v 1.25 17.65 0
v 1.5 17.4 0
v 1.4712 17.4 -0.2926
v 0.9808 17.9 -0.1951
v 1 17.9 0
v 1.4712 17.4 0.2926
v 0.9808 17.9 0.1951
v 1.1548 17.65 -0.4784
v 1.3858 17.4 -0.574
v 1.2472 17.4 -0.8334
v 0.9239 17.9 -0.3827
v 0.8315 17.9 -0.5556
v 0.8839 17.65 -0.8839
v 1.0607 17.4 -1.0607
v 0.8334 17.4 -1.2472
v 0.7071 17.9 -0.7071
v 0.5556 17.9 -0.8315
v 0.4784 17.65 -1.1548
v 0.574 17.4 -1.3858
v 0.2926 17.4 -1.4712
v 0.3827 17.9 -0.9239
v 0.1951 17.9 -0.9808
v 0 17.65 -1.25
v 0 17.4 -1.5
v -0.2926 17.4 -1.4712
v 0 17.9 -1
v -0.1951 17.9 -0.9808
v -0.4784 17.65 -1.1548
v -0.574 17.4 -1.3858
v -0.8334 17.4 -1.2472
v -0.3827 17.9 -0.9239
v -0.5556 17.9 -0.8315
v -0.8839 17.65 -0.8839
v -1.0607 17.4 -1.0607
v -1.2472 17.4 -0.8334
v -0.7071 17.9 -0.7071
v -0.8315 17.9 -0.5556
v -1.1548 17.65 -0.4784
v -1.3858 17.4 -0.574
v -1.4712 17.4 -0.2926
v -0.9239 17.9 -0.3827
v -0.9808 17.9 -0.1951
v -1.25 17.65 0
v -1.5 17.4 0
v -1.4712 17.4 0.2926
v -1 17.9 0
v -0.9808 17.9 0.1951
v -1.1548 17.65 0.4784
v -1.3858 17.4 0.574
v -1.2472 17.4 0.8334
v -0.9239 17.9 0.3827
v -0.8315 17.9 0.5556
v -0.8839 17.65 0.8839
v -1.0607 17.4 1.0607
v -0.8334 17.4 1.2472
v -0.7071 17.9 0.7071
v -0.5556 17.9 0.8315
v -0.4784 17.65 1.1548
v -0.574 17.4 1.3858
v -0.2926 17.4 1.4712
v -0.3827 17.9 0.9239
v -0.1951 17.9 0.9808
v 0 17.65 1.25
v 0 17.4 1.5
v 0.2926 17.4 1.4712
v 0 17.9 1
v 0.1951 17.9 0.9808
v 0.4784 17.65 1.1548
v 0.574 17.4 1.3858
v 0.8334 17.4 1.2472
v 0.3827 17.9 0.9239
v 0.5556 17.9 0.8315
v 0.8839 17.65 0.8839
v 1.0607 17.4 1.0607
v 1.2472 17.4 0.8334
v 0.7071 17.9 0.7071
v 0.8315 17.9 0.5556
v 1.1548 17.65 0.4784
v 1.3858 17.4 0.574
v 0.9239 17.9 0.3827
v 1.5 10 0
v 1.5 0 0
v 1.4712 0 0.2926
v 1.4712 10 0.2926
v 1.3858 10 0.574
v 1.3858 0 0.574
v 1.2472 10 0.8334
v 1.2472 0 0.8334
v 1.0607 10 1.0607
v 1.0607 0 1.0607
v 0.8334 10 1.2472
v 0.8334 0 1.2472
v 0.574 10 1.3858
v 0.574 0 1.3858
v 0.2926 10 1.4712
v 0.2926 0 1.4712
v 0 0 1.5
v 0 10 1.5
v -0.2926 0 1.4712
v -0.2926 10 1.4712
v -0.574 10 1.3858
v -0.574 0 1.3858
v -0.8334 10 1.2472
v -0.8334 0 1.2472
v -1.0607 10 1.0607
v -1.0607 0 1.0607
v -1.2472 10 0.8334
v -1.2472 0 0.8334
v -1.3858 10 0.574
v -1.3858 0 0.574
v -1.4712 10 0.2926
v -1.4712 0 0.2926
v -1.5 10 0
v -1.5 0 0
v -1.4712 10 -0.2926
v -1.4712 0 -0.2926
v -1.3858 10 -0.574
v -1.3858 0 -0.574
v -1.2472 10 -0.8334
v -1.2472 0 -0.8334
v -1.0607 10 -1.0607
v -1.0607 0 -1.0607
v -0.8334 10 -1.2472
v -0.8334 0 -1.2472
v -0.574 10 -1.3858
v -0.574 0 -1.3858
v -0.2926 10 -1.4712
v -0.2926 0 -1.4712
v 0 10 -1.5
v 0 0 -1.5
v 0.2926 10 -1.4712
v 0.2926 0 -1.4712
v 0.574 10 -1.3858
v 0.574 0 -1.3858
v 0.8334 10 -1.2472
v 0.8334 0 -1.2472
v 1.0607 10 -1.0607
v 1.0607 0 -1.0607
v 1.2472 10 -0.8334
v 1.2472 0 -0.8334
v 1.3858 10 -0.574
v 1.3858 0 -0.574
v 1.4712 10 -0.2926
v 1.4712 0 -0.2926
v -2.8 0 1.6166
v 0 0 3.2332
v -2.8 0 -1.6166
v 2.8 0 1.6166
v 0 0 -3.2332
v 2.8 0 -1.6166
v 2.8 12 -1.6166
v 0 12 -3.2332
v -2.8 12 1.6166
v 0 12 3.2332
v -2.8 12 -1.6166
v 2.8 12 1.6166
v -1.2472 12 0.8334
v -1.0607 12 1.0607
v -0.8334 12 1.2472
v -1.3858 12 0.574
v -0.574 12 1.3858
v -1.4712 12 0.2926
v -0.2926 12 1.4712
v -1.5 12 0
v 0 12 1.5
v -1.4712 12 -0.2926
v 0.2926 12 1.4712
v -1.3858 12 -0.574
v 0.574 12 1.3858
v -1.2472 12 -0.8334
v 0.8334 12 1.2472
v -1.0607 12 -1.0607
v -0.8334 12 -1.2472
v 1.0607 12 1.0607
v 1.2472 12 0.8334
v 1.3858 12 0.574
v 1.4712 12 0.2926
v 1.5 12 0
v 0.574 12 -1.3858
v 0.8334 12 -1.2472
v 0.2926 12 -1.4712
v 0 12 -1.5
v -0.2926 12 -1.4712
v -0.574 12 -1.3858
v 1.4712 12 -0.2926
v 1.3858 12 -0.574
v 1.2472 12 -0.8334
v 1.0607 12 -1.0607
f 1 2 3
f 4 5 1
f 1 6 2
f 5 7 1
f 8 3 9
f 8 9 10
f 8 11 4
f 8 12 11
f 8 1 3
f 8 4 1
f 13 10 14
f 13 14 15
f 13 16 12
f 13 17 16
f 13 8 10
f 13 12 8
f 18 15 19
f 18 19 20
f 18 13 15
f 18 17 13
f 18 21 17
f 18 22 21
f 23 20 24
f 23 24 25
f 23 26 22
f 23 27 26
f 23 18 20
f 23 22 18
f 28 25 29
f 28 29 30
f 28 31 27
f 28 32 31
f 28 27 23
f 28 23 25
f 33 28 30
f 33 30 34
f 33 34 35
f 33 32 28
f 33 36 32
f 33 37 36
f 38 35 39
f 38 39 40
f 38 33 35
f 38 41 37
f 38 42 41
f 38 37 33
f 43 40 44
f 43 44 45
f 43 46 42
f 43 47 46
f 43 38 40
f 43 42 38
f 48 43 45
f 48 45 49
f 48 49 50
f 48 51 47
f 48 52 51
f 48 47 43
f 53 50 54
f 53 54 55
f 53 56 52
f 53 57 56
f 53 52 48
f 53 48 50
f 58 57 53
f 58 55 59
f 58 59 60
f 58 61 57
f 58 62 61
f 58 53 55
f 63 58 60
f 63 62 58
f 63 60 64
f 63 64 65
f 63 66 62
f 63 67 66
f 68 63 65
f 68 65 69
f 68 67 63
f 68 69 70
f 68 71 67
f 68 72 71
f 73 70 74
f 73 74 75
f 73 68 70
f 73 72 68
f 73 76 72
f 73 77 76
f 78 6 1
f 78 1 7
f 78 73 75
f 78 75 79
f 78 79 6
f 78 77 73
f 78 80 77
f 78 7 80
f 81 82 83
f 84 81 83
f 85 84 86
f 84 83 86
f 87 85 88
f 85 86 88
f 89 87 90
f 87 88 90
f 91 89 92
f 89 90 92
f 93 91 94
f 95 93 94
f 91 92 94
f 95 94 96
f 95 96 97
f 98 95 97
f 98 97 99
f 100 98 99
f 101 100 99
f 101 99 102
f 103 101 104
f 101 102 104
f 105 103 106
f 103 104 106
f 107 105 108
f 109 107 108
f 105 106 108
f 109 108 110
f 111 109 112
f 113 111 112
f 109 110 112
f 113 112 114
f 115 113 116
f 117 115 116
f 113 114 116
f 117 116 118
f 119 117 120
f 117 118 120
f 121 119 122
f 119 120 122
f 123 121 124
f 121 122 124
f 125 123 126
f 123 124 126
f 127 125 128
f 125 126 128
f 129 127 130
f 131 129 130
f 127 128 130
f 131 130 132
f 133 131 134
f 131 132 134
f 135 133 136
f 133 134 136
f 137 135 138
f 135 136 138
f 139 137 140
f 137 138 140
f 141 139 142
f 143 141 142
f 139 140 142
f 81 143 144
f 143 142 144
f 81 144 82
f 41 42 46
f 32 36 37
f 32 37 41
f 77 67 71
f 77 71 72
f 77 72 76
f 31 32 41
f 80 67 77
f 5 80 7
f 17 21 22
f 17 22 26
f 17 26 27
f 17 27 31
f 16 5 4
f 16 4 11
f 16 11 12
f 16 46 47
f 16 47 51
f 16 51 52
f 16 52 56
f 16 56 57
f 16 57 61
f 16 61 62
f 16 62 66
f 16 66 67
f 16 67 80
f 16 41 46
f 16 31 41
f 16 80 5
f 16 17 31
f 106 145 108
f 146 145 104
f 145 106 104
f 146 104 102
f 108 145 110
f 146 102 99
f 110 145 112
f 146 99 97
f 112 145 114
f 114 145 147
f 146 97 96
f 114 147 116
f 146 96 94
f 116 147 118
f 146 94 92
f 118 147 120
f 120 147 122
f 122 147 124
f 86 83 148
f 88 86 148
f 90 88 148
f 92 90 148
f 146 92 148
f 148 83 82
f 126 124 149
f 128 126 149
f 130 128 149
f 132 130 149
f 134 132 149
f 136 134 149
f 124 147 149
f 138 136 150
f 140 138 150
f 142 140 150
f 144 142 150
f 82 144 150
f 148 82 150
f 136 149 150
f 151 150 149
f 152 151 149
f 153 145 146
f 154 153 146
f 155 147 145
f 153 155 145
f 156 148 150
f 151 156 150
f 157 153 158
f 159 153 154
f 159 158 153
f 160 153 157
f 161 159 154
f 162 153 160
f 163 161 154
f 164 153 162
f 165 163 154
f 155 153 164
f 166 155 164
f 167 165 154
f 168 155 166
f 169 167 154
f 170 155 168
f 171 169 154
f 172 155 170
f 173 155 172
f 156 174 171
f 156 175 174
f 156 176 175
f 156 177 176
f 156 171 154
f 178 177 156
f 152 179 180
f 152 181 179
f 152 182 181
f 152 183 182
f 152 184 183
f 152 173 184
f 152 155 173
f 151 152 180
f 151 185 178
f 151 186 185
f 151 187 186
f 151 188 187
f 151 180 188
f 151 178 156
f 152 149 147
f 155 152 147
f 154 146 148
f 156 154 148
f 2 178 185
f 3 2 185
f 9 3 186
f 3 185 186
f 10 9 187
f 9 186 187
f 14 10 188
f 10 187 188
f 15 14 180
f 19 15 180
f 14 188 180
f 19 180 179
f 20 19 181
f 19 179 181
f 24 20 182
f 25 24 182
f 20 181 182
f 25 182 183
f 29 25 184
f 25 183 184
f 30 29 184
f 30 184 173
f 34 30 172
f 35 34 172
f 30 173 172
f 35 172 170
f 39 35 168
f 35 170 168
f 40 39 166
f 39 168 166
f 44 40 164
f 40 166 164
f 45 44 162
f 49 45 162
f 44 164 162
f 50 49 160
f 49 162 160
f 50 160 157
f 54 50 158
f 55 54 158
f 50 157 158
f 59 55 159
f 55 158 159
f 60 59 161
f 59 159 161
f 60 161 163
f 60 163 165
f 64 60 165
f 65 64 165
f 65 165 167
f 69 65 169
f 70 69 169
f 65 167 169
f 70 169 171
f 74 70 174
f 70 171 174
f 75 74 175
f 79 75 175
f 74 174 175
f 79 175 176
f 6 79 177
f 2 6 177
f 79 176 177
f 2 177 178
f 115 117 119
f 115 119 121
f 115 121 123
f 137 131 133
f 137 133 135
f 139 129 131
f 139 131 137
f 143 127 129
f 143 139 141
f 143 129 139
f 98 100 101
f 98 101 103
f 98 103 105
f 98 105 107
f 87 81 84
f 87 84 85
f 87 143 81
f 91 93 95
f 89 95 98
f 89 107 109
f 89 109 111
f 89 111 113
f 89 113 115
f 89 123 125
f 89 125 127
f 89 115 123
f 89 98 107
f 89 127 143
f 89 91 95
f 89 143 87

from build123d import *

# Parameters (mm, degrees)
BOSS_EXTRUDE1_DEPTH = 12
SKETCH2_R           = 1.5
BOSS_EXTRUDE2_DEPTH = 5.9
SKETCH3_R           = 1.5
CUT_EXTRUDE1_DEPTH  = 10
CHAMFER1_SIZE       = 0.5


with BuildPart() as part:
    # Sketch1 → Boss-Extrude1 (new body)
    with BuildSketch(Plane(origin=(0, 0, 0), x_dir=(1, 0, 0), z_dir=(0, 1, 0))):
        Polygon((0, -3.233161507), (2.8, -1.616580754), (2.8, 1.616580754), (0, 3.233161507), (-2.8, 1.616580754), (-2.8, -1.616580754), align=None)
    extrude(amount=BOSS_EXTRUDE1_DEPTH)

    # Sketch2 → Boss-Extrude2 (add)
    with BuildSketch(Plane(origin=(0, 12, 0), x_dir=(1, 0, 0), z_dir=(0, 1, 0))):
        Circle(SKETCH2_R)
    extrude(amount=BOSS_EXTRUDE2_DEPTH)

    # Sketch3 → Cut-Extrude1 (cut)
    with BuildSketch(Plane.XZ):
        Circle(SKETCH3_R)
    extrude(amount=-CUT_EXTRUDE1_DEPTH, mode=Mode.SUBTRACT)

    # Chamfer1
    chamfer1_edges = [part.edges().sort_by_distance(p)[0] for p in [
        (-1.5, 17.9, 0),
    ]]
    chamfer(chamfer1_edges, length=CHAMFER1_SIZE)


solid = part.part
